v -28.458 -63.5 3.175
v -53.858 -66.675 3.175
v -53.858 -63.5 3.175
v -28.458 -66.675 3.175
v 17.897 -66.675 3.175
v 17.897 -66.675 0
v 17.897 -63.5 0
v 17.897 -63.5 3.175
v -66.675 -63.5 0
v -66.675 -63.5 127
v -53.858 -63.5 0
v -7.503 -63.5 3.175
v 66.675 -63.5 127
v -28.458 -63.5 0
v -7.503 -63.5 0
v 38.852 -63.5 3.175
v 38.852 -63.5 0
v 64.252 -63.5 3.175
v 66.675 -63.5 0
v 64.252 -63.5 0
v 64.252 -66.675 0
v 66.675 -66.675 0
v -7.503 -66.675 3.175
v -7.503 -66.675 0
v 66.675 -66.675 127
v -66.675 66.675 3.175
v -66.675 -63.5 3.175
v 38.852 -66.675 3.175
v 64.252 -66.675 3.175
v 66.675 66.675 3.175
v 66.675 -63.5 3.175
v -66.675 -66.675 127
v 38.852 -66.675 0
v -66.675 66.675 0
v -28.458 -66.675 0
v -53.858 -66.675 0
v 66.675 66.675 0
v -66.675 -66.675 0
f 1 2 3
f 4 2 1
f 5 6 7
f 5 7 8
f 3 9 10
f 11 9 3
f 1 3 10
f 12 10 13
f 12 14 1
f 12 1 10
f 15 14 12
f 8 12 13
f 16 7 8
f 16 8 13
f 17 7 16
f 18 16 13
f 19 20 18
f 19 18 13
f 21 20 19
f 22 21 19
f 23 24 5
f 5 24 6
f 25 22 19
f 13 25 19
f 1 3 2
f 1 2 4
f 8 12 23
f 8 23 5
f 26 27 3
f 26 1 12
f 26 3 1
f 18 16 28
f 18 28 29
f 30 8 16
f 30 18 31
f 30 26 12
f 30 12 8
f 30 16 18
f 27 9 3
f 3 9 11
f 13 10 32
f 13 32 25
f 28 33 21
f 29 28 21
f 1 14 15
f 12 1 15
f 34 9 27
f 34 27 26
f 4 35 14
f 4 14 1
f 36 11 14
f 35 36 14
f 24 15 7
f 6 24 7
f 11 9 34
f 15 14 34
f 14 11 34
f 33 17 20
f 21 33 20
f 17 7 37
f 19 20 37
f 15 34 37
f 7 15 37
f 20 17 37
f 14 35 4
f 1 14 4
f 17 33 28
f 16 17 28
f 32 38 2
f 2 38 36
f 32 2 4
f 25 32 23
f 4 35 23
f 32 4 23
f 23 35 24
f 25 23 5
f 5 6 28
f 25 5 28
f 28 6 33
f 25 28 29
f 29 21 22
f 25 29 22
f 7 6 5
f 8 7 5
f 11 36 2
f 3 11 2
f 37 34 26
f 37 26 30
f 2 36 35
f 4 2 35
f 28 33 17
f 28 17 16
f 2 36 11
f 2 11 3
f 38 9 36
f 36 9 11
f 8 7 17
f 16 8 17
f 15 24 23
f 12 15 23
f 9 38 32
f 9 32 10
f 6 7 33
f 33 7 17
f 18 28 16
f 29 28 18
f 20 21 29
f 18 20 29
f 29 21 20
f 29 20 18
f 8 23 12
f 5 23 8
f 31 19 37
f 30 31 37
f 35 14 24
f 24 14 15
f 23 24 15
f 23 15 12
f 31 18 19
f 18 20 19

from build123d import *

# Parameters (mm, degrees)
F0_W     = 133.35
F0_H     = 133.35
F1_DEPTH = 3.175
F2_W     = 133.35
F2_H     = 3.175
F3_DEPTH = 127
F4_W     = 25.4
F4_H     = 3.175
F5_DEPTH = 25.4


with BuildPart() as f1:
    # F0 (on Top) → F1 (new body)
    with BuildSketch(Plane.XY):
        Rectangle(F0_W, F0_H)
    extrude(amount=F1_DEPTH)


with BuildPart() as f3:
    # F2 (on Top) → F3 (new body)
    with BuildSketch(Plane.XY):
        with Locations((0, -65.0875)):
            Rectangle(F2_W, F2_H)
    extrude(amount=F3_DEPTH)

    # F4 (on face) → F5 (cut)
    with BuildSketch(Plane.XZ.offset(66.675)):
        with Locations((-41.1575537503, 1.5875)):
            Rectangle(F4_W, F4_H)
        with Locations((5.1974462497, 1.5875)):
            Rectangle(F4_W, F4_H)
        with Locations((51.5524462497, 1.5875)):
            Rectangle(F4_W, F4_H)
    extrude(amount=-F5_DEPTH, mode=Mode.SUBTRACT)


with BuildPart() as f1_1:
    add(f1.part)

    # F6: cut F3
    add(f3.part, mode=Mode.SUBTRACT)


solid = Compound([f3.part, f1_1.part])
